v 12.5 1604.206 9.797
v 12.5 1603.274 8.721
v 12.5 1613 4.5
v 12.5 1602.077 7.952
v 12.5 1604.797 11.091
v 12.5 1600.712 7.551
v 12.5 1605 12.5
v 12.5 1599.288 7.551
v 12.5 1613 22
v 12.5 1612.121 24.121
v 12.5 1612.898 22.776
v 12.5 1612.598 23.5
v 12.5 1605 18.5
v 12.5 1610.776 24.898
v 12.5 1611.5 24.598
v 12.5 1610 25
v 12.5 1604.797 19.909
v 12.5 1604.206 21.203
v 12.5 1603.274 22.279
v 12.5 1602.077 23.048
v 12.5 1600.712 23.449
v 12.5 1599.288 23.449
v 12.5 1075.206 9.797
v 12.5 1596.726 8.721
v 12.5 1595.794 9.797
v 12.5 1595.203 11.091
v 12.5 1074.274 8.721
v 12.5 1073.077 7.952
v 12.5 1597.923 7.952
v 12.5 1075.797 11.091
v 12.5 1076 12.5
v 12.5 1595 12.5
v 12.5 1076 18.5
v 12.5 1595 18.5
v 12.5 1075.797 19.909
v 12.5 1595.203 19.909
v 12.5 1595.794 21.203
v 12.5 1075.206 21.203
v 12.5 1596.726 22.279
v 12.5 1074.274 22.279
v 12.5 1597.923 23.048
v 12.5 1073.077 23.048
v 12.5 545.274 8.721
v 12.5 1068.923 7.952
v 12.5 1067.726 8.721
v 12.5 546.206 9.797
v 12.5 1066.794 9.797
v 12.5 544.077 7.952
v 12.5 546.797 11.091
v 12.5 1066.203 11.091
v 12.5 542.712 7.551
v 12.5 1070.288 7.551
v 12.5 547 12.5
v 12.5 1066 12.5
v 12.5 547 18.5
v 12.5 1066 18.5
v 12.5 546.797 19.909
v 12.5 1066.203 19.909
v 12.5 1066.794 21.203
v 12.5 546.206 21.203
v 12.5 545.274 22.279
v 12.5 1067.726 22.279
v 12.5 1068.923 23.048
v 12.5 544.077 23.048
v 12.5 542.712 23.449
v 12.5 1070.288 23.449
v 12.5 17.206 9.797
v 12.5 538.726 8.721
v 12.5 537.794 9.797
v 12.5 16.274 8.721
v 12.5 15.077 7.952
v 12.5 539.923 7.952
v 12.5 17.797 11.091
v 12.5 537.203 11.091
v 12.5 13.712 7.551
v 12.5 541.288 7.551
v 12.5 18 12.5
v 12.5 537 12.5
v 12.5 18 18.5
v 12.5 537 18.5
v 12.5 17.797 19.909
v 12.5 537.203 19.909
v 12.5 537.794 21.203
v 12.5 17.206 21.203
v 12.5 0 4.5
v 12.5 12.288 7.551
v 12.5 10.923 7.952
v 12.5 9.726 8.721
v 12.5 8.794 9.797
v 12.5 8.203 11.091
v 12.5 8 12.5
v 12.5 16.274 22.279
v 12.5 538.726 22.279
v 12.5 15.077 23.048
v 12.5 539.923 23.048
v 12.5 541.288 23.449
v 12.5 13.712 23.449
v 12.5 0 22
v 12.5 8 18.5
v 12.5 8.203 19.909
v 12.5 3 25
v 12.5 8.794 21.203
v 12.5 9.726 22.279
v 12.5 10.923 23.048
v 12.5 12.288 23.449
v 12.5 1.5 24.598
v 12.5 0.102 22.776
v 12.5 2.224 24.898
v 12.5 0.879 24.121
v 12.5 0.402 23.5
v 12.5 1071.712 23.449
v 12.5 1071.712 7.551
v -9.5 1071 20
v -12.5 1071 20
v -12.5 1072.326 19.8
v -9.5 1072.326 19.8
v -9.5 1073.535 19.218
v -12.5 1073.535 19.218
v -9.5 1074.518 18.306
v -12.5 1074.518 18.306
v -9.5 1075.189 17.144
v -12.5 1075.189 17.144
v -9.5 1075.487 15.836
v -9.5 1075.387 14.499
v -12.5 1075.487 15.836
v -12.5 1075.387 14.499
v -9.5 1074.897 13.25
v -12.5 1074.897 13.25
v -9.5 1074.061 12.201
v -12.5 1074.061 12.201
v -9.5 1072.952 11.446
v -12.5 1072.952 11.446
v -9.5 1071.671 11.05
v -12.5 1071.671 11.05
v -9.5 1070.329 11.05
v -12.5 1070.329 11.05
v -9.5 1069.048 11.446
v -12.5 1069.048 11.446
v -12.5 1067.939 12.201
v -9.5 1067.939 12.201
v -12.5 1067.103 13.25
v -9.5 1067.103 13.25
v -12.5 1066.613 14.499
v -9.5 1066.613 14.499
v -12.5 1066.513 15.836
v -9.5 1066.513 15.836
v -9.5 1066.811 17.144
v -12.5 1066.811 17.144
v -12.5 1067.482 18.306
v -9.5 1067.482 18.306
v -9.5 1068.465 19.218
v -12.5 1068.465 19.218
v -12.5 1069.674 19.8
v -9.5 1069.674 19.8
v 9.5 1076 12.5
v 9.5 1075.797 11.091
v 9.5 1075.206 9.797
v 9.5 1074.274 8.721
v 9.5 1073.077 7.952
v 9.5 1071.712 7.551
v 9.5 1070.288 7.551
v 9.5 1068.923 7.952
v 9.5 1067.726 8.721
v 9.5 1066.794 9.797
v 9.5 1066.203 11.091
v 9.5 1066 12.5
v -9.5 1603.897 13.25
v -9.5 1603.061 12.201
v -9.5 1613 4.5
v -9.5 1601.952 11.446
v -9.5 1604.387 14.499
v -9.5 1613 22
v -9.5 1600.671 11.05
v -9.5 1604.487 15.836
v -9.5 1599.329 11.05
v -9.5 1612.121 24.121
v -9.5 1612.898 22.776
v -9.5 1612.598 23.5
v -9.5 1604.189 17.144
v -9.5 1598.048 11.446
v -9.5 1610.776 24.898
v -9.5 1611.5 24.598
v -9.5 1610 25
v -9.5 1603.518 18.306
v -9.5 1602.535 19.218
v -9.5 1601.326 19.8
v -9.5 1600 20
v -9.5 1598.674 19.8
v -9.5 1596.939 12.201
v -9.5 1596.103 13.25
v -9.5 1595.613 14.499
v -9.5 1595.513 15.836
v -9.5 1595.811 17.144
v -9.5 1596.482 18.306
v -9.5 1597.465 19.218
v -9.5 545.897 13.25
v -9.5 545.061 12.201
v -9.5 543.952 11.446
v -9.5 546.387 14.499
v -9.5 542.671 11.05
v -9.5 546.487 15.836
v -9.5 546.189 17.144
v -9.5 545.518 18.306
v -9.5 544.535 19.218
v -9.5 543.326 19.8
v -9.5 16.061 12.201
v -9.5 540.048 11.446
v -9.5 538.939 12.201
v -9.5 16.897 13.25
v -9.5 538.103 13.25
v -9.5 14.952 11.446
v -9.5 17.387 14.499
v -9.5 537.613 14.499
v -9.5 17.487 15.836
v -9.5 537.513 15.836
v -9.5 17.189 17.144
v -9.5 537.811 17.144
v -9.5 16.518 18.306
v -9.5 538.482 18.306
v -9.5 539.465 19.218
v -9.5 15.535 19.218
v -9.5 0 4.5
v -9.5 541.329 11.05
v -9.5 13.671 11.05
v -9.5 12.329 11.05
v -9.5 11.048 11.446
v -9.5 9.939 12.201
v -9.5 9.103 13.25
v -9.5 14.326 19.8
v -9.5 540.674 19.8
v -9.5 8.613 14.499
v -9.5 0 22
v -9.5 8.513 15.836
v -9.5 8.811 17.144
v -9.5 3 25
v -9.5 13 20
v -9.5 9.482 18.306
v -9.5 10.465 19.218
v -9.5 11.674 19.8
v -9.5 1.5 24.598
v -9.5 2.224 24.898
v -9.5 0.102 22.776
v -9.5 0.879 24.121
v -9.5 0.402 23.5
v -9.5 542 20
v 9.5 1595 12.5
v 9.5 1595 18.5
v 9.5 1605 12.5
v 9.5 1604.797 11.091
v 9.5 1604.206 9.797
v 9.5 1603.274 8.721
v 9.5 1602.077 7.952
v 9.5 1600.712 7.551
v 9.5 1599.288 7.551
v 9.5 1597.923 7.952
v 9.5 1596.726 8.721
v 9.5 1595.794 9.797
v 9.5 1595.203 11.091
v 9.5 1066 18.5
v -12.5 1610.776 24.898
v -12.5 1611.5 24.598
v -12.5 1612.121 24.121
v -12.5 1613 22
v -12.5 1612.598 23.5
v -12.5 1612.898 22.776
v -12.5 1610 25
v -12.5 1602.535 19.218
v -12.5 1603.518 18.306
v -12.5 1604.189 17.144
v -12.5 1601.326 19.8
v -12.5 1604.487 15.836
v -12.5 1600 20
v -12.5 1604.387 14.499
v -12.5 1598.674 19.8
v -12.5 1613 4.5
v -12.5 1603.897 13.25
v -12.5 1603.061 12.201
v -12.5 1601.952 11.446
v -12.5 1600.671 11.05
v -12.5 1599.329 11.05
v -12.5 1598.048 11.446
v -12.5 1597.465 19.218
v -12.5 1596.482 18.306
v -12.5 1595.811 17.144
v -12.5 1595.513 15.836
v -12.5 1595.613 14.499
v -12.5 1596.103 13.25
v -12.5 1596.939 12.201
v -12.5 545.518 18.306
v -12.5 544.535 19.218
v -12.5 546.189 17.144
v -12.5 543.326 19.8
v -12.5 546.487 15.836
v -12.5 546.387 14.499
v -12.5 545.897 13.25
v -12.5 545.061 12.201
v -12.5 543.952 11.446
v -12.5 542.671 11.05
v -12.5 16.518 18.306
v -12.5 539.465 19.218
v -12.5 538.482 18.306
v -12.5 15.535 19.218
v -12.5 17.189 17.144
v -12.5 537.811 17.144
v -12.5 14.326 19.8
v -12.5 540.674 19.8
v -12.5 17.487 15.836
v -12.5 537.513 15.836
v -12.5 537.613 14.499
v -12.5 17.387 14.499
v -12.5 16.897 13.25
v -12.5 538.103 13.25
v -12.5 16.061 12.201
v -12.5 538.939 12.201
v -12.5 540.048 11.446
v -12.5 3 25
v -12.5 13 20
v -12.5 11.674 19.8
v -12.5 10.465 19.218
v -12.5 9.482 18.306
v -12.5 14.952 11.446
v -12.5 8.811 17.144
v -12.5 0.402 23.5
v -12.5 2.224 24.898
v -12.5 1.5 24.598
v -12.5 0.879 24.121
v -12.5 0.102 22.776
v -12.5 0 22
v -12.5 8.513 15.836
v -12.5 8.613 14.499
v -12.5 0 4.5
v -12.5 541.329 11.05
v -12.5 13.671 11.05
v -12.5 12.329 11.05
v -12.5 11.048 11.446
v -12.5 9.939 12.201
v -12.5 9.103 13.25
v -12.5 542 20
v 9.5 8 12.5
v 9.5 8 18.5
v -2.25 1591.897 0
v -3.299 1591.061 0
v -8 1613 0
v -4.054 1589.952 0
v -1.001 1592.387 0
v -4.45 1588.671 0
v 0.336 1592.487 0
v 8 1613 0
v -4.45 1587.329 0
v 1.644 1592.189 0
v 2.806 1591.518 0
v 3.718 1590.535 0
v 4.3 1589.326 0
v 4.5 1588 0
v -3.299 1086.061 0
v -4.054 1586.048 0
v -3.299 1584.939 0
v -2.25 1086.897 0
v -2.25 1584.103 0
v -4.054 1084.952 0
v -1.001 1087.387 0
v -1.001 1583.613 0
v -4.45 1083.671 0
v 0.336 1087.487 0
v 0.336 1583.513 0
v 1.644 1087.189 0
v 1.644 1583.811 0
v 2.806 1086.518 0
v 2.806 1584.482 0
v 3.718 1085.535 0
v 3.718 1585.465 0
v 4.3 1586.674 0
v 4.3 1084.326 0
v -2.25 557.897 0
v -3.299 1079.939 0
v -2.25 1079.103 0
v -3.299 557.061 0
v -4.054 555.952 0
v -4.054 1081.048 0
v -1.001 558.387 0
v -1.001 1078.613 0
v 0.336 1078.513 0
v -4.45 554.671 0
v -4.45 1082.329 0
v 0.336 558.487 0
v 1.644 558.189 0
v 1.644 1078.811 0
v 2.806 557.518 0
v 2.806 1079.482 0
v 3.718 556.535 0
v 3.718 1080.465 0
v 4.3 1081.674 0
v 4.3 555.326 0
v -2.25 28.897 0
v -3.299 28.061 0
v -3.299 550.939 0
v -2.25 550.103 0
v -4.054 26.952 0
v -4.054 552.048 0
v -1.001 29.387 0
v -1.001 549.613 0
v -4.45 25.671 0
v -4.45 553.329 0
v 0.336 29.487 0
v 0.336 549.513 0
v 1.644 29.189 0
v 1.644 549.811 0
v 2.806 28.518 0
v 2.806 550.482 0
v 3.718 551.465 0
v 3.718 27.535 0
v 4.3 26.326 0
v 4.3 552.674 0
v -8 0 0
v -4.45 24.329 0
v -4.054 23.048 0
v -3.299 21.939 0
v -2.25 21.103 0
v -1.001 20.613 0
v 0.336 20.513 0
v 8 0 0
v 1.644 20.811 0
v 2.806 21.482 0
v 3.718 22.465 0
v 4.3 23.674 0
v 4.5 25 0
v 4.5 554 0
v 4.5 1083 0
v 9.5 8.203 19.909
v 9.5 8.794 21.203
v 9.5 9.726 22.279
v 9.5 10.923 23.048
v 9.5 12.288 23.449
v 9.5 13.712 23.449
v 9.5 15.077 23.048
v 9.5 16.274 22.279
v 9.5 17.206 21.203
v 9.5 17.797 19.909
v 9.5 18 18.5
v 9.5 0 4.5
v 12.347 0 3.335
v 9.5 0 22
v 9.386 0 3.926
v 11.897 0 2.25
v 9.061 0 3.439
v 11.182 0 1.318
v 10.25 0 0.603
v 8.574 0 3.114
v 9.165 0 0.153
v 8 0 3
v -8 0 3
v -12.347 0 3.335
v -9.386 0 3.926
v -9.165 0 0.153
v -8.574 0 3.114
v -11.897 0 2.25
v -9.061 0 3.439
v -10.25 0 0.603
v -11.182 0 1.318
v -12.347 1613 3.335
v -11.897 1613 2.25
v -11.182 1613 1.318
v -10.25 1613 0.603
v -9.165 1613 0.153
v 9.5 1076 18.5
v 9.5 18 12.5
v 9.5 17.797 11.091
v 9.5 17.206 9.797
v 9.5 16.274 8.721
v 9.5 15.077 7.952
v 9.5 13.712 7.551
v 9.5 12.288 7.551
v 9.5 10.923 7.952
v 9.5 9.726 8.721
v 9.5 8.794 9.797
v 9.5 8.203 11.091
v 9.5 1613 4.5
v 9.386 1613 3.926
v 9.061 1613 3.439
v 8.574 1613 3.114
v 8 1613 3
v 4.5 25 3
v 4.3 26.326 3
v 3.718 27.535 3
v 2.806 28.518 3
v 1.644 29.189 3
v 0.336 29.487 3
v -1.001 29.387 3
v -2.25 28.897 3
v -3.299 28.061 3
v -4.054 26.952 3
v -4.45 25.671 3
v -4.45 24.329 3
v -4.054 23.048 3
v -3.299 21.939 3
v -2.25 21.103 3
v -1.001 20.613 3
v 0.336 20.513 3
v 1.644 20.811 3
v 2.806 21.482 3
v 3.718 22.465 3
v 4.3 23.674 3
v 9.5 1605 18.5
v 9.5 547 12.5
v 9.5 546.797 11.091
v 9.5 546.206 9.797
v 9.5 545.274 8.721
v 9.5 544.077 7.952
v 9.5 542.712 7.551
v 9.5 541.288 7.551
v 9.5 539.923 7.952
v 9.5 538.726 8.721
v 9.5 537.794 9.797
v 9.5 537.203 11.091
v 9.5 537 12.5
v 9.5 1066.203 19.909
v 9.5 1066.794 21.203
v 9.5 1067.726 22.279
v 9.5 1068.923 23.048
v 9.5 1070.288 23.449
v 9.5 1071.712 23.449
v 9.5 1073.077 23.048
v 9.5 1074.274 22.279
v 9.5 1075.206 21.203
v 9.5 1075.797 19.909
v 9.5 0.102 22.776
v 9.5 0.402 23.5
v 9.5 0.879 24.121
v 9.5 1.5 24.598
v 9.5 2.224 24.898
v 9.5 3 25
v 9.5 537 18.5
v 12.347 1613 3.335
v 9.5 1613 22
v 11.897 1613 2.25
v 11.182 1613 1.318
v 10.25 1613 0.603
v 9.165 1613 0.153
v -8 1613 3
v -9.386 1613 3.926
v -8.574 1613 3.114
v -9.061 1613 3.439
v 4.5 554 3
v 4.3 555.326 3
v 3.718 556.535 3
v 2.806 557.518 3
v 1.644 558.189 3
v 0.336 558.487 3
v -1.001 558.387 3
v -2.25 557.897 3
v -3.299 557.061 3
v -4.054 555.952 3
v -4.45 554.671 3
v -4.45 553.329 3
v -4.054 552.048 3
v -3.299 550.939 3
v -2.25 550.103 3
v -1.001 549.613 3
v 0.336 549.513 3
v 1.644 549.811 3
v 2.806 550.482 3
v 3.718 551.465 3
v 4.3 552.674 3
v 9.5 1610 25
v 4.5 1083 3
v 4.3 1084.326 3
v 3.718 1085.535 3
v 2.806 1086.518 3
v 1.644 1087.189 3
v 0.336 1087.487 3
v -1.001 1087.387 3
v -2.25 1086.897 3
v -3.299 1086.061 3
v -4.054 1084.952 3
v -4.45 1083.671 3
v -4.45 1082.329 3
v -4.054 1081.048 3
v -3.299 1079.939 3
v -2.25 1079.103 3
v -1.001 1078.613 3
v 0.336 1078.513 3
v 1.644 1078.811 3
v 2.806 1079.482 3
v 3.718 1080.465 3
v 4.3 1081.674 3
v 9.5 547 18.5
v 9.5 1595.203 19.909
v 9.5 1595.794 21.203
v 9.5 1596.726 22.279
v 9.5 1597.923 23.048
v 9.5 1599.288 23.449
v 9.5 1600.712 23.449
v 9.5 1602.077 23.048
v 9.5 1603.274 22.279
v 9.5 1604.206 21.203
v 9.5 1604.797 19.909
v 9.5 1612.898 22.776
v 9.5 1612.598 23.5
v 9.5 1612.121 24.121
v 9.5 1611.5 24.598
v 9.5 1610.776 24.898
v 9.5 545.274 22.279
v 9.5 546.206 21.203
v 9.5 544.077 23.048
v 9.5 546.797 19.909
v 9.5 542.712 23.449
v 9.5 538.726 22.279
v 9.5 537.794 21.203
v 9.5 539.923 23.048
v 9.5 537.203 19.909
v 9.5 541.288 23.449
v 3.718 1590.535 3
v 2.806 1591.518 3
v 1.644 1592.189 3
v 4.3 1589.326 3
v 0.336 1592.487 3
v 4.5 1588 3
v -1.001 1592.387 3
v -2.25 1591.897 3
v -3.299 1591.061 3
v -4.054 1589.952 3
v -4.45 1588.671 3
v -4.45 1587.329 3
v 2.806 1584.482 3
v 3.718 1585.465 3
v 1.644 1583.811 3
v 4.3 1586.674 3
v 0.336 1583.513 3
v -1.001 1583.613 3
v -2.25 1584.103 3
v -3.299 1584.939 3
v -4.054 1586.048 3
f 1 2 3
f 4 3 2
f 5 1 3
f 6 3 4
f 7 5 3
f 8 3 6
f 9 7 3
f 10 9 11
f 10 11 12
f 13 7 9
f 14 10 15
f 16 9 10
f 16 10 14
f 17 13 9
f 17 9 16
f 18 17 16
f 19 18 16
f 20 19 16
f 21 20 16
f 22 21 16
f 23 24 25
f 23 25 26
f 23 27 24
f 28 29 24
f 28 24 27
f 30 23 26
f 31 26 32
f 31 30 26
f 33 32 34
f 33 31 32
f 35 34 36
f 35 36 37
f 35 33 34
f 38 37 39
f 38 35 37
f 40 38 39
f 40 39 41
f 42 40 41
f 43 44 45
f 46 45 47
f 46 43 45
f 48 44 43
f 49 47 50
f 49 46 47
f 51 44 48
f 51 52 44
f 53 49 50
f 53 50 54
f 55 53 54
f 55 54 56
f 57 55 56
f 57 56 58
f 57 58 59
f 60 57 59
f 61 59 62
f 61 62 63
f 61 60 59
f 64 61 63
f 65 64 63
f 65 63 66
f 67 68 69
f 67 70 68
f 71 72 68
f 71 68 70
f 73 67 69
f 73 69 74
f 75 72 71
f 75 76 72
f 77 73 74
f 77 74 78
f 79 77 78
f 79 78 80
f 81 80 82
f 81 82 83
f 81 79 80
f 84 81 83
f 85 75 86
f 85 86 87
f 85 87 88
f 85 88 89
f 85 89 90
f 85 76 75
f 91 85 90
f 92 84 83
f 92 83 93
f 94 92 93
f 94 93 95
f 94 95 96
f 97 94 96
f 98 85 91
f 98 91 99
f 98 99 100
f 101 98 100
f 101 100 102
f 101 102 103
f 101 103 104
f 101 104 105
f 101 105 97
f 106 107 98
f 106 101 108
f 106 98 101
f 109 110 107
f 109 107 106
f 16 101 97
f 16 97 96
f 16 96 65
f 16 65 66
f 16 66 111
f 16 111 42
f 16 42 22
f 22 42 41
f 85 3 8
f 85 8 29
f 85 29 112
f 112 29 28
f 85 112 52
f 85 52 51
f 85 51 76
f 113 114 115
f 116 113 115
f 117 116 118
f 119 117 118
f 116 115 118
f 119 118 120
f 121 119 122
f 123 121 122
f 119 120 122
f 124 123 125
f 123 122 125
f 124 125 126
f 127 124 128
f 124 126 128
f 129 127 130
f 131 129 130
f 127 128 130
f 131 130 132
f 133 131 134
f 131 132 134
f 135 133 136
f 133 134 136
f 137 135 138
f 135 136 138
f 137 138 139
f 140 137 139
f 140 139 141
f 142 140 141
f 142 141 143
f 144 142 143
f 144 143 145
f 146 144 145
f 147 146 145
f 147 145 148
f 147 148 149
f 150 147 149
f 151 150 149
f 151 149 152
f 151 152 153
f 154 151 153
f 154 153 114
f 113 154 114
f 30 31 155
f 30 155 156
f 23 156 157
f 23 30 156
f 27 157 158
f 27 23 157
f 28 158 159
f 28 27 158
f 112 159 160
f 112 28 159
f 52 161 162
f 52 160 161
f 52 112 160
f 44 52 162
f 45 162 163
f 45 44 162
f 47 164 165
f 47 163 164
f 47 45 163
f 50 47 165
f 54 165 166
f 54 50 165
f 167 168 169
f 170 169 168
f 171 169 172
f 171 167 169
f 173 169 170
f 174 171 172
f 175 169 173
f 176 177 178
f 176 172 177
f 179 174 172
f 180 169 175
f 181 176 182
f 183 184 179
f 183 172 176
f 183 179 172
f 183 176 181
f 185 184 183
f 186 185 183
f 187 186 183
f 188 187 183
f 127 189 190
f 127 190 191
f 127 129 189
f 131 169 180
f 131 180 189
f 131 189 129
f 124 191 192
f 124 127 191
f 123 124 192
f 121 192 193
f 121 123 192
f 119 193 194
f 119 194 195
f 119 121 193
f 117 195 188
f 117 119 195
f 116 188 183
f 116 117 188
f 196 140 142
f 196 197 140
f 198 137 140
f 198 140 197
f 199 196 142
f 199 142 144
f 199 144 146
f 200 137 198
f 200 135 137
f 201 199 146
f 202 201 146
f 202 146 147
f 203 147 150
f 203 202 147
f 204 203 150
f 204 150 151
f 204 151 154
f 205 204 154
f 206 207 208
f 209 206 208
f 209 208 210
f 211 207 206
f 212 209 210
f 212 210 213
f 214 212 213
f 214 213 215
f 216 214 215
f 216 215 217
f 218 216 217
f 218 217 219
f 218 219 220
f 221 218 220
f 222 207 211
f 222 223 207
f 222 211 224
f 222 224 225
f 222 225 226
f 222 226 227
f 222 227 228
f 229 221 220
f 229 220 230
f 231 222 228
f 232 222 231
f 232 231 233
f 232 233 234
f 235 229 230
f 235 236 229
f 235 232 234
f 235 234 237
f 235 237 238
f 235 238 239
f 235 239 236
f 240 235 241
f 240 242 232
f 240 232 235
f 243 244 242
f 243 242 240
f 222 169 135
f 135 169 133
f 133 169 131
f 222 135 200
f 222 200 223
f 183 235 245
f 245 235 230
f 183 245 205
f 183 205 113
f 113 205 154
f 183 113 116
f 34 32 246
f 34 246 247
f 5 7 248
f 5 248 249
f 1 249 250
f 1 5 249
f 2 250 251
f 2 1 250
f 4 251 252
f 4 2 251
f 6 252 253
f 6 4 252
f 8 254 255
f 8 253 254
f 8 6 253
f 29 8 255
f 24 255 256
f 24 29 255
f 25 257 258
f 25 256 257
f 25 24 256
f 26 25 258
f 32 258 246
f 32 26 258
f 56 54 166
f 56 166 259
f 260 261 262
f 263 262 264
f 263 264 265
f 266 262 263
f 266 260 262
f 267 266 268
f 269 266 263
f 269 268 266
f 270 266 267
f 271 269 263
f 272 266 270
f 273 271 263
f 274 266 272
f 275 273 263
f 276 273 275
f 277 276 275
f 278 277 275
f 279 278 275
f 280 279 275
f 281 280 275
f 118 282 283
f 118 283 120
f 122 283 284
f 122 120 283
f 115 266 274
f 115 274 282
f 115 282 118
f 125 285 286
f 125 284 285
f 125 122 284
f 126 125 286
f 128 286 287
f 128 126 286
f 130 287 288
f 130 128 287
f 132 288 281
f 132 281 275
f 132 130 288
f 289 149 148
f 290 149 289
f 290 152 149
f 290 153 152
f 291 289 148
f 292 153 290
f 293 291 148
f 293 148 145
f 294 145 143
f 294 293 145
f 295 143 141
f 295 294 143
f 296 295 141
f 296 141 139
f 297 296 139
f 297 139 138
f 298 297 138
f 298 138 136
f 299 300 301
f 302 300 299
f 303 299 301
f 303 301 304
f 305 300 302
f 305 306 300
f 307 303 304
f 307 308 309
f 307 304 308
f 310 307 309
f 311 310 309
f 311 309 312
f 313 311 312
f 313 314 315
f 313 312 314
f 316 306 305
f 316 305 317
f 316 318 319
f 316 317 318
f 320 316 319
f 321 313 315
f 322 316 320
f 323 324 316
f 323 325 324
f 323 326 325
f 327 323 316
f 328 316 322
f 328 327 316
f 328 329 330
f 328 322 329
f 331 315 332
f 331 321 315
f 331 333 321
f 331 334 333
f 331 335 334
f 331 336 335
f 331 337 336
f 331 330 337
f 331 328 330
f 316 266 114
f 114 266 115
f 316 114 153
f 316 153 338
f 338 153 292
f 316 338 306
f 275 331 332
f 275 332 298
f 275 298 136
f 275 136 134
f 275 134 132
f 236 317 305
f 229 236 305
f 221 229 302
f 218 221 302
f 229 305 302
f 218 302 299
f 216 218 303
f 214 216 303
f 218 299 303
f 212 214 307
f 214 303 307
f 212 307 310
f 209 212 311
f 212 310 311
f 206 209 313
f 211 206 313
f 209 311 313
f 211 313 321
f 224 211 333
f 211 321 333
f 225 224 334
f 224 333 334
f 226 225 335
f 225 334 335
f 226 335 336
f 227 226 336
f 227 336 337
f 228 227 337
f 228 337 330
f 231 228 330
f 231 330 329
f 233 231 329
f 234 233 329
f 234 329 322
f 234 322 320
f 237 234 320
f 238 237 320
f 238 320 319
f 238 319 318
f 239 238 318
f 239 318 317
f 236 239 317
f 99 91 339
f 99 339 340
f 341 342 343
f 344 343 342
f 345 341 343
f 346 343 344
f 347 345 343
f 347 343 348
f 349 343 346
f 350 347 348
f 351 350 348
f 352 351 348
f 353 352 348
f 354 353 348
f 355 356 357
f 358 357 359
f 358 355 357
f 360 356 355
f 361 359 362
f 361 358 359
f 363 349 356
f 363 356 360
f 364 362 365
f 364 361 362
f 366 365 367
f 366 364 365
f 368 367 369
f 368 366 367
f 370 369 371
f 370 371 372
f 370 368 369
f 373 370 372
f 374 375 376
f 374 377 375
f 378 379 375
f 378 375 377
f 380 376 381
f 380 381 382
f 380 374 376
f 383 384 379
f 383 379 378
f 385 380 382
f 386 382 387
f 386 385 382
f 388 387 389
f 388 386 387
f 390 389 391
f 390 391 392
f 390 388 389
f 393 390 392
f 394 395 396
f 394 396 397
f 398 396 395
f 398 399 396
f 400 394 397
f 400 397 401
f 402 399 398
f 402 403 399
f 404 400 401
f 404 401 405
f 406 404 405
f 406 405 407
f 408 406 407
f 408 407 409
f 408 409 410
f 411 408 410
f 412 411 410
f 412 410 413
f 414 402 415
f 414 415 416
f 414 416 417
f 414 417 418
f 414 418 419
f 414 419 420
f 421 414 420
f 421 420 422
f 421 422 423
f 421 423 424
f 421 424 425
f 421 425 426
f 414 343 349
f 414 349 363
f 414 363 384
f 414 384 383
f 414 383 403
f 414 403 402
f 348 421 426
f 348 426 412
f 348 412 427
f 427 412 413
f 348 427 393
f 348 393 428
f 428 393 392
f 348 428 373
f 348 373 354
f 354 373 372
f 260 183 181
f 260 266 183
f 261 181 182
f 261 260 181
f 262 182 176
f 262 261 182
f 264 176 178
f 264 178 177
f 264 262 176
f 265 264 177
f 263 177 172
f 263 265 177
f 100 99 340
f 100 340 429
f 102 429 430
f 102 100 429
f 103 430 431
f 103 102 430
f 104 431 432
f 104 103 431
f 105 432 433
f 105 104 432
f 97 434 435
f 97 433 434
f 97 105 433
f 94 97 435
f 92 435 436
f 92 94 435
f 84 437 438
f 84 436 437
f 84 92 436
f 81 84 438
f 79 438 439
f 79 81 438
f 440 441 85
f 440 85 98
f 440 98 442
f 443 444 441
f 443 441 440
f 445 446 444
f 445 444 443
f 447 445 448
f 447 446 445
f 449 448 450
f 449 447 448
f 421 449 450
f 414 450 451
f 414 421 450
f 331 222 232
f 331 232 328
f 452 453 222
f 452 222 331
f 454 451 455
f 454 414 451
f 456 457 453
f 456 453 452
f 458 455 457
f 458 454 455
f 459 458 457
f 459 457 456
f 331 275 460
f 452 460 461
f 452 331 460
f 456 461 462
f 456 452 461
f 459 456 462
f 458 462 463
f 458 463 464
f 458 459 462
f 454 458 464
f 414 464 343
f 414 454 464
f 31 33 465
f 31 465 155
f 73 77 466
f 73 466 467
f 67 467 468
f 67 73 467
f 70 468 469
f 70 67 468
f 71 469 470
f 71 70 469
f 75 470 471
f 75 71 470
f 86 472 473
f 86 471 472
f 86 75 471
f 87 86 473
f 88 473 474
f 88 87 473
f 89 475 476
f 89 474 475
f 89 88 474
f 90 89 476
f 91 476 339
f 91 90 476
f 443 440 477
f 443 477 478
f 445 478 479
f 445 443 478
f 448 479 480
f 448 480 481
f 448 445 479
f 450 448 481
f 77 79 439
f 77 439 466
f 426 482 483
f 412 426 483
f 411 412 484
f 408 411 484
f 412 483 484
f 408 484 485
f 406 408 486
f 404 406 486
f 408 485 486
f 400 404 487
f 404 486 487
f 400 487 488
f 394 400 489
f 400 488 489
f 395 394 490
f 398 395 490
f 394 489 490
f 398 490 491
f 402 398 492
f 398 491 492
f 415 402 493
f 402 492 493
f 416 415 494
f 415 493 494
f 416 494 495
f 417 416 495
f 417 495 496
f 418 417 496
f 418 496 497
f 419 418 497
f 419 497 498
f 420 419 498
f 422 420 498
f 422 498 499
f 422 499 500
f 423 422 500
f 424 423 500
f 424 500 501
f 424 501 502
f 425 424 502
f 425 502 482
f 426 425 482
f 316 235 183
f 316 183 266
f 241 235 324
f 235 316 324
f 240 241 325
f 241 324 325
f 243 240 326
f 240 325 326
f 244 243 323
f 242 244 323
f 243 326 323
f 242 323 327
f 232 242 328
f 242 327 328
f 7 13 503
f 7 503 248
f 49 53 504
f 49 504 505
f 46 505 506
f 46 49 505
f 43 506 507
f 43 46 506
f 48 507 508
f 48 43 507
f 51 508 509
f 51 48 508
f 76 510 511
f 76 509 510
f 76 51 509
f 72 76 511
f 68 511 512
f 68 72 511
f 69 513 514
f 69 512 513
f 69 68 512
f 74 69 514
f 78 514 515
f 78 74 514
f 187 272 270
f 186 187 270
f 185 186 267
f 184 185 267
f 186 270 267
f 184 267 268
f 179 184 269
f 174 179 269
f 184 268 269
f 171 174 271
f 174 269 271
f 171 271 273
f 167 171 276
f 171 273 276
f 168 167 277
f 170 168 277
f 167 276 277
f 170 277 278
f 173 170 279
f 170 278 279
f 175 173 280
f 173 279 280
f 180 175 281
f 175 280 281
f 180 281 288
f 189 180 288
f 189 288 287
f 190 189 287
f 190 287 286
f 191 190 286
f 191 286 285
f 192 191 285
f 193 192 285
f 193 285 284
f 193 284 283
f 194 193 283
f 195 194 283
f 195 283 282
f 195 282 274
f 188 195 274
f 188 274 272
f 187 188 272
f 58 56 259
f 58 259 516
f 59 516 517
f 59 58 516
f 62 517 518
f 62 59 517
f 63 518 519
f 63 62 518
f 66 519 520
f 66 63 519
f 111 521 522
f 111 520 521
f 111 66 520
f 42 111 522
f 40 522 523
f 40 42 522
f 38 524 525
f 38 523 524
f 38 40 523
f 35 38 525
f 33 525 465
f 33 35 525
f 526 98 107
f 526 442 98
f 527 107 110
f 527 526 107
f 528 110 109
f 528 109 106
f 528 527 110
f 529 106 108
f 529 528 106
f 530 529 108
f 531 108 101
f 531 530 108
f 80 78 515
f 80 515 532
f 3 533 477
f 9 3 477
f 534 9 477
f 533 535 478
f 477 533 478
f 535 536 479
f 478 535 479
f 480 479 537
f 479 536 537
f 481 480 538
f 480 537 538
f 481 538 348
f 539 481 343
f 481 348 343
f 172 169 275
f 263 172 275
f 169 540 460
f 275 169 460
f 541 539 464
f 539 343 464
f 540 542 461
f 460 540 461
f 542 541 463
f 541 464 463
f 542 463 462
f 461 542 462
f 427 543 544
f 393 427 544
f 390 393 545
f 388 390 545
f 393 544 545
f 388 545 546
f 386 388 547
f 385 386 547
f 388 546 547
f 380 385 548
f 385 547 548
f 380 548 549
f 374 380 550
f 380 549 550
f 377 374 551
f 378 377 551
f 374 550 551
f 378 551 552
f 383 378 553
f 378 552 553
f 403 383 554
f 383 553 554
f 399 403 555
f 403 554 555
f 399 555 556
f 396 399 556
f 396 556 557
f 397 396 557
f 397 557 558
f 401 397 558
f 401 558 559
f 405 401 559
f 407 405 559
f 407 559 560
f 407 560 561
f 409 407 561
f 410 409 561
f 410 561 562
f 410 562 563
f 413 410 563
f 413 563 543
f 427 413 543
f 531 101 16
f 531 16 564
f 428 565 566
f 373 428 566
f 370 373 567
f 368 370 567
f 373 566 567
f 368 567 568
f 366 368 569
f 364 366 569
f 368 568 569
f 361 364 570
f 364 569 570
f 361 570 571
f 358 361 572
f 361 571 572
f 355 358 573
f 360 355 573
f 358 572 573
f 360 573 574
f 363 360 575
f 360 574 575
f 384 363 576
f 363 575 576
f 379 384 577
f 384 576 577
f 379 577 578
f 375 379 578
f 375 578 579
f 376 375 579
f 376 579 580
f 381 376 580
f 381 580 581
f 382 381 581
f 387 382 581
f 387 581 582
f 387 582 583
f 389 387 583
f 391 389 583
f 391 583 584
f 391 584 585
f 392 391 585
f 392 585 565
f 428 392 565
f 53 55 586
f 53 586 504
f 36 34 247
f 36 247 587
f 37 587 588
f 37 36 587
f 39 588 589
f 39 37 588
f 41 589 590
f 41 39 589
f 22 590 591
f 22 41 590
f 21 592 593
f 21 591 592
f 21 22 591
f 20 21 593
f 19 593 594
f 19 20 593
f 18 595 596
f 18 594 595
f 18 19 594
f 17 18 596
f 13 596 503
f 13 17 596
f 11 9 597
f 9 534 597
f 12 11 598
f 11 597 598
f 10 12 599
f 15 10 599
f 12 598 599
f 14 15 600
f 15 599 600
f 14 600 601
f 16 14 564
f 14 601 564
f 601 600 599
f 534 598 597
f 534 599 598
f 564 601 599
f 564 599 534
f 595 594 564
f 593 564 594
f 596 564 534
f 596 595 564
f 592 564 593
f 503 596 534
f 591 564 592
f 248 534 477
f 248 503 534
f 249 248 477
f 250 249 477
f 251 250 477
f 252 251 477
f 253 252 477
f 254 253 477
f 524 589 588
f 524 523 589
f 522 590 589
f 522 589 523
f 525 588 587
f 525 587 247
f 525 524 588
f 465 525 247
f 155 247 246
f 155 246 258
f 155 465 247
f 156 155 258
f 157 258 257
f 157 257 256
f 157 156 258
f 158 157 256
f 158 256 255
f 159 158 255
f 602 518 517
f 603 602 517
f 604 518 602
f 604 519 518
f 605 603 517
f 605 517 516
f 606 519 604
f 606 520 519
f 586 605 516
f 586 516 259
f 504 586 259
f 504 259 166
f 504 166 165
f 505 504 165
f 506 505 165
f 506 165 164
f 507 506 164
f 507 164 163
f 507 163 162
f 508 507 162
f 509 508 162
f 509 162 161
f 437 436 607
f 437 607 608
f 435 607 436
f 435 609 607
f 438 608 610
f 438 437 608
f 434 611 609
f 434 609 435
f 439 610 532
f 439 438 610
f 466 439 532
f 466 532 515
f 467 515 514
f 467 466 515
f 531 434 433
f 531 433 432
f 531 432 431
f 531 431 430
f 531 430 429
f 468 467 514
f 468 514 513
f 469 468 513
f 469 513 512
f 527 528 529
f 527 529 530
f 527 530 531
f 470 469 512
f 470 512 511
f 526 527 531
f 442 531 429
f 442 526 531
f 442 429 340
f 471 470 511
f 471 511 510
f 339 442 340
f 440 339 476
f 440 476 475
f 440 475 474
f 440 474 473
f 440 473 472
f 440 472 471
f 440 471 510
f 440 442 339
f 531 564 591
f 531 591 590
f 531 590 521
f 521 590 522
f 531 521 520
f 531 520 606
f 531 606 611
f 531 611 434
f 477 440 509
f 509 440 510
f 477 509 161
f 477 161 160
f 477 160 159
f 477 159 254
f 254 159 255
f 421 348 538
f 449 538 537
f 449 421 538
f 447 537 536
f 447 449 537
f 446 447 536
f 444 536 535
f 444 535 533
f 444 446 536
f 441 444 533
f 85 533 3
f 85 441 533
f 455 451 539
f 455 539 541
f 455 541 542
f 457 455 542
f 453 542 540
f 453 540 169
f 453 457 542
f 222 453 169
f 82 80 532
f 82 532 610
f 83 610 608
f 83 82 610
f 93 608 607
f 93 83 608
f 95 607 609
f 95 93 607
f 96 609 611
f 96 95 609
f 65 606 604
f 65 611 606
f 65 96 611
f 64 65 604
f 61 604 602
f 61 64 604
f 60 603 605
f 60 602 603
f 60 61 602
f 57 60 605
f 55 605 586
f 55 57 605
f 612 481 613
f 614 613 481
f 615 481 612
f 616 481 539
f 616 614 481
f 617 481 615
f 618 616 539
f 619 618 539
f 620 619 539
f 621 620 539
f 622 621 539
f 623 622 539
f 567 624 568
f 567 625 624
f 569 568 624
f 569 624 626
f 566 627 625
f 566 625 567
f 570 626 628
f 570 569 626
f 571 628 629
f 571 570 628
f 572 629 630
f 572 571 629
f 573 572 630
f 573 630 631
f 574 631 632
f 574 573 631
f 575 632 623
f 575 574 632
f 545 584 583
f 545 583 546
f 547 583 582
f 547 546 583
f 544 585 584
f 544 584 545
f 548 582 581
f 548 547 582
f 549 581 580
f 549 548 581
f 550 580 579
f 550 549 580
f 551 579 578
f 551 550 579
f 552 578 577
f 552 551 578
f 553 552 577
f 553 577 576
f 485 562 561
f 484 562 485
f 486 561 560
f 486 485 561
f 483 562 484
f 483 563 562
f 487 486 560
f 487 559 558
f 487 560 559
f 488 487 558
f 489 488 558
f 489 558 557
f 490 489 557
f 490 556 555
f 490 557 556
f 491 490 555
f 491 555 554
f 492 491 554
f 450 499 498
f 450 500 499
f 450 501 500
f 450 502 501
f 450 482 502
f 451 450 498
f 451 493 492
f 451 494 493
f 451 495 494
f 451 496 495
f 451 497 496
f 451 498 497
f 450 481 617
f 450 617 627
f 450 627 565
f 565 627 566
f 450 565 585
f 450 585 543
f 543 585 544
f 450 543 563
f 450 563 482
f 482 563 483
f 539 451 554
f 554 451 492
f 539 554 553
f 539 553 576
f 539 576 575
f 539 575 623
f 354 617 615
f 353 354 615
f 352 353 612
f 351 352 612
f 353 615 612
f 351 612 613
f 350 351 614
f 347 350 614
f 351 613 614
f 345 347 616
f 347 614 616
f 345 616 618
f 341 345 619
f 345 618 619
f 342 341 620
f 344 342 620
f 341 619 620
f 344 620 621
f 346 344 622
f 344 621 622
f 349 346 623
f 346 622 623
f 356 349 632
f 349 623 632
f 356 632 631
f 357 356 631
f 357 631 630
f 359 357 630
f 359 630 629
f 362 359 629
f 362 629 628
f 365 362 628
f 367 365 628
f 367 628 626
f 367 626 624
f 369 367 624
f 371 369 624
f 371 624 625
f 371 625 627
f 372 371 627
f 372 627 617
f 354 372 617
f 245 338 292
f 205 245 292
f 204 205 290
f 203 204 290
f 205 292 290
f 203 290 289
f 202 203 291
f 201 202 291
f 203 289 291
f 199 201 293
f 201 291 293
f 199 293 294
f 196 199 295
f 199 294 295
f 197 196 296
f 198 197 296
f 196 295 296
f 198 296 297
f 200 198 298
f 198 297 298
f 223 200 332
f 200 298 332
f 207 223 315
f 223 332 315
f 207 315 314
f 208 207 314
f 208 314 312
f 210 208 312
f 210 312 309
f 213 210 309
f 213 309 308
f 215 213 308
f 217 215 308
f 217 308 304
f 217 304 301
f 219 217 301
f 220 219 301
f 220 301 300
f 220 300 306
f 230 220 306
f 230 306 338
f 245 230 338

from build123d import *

# Parameters (mm, degrees)
BASE_FLANGE1_DEPTH = 1613
CUT_EXTRUDE1_REACH = 1615.387
SKETCH6_R          = 4.5
FILLET1_R          = 3
CUT_EXTRUDE2_REACH = 1615.387
LPATTERN1_COUNT    = 4
LPATTERN1_PITCH    = 529
CUT_EXTRUDE3_REACH = 1615.198
SKETCH11_R         = 4.5
LPATTERN2_COUNT    = 3
LPATTERN2_PITCH    = 529
CUT_EXTRUDE4_REACH = 1615.198
SKETCH12_R         = 4.5


# Sheet-metal steps are written as plain solids
with BuildPart() as part:
    # Sketch1 → Base-Flange1 (new body)
    with BuildSketch(Plane(origin=(0, 0, 0), x_dir=(1, 0, 0), z_dir=(0, 1, 0))):
        with BuildLine():
            Line((-12.5, -25), (-12.5, -4.5))
            ThreePointArc((-12.5, -4.5), (-11.181980515, -1.318019485), (-8, 0))
            Line((-8, 0), (8, 0))
            ThreePointArc((8, 0), (11.181980515, -1.318019485), (12.5, -4.5))
            Line((12.5, -4.5), (12.5, -25))
            Line((12.5, -25), (9.5, -25))
            Line((9.5, -25), (9.5, -4.5))
            ThreePointArc((9.5, -4.5), (9.060660172, -3.439339828), (8, -3))
            Line((8, -3), (-8, -3))
            ThreePointArc((-8, -3), (-9.060660172, -3.439339828), (-9.5, -4.5))
            Line((-9.5, -4.5), (-9.5, -25))
            Line((-9.5, -25), (-12.5, -25))
        make_face()
    extrude(amount=BASE_FLANGE1_DEPTH)

    # Sketch6 → Cut-Extrude1 (cut, up to next)
    with BuildSketch(Plane.ZY.offset(12.5), mode=Mode.PRIVATE) as cut_extrude1_sk1:
        with Locations((15.5, 13)):
            Circle(SKETCH6_R)
    cut_extrude1_tool1 = extrude(cut_extrude1_sk1.sketch, amount=-CUT_EXTRUDE1_REACH, mode=Mode.PRIVATE) & part.part
    cut_extrude1 = cut_extrude1_tool1.solids().sort_by_distance((-12.5, 13, 15.5))[0]
    add(cut_extrude1, mode=Mode.SUBTRACT)

    # Fillet1
    fillet1_edges = [part.edges().sort_by_distance(p)[0] for p in [
        (11, 0, 25),
        (-11, 0, 25),
        (11, 1613, 25),
        (-11, 1613, 25),
    ]]
    fillet(fillet1_edges, radius=FILLET1_R)

    # Sketch7 → Cut-Extrude2 (cut, up to next)
    with BuildSketch(Plane(origin=(12.5, 0, 0), x_dir=(0, 0, -1), z_dir=(1, 0, 0)), mode=Mode.PRIVATE) as cut_extrude2_sk1:
        with BuildLine():
            Line((-18.5, 18), (-12.5, 18))
            ThreePointArc((-12.5, 18), (-7.5, 13), (-12.5, 8))
            Line((-12.5, 8), (-18.5, 8))
            ThreePointArc((-18.5, 8), (-23.5, 13), (-18.5, 18))
        make_face()
    cut_extrude2_tool1 = extrude(cut_extrude2_sk1.sketch, amount=-CUT_EXTRUDE2_REACH, mode=Mode.PRIVATE) & part.part
    cut_extrude2 = cut_extrude2_tool1.solids().sort_by_distance((12.5, 13, 15.5))[0]
    add(cut_extrude2, mode=Mode.SUBTRACT)

    # LPattern1: Cut-Extrude1, Cut-Extrude2 ×4
    with Locations(*[(0, i * LPATTERN1_PITCH, 0) for i in range(1, LPATTERN1_COUNT)]):
        add(cut_extrude1, mode=Mode.SUBTRACT)
        add(cut_extrude2, mode=Mode.SUBTRACT)

    # Sketch11 → Cut-Extrude3 (cut, up to next)
    with BuildSketch(Plane.XY.offset(3), mode=Mode.PRIVATE) as cut_extrude3_sk1:
        with Locations((0, 25)):
            Circle(SKETCH11_R)
    cut_extrude3_tool1 = extrude(cut_extrude3_sk1.sketch, amount=-CUT_EXTRUDE3_REACH, mode=Mode.PRIVATE) & part.part
    cut_extrude3 = cut_extrude3_tool1.solids().sort_by_distance((0, 25, 3))[0]
    add(cut_extrude3, mode=Mode.SUBTRACT)

    # LPattern2: Cut-Extrude3 ×3
    with Locations(*[(0, i * LPATTERN2_PITCH, 0) for i in range(1, LPATTERN2_COUNT)]):
        add(cut_extrude3, mode=Mode.SUBTRACT)

    # Sketch12 → Cut-Extrude4 (cut, up to next)
    with BuildSketch(Plane.XY.offset(3), mode=Mode.PRIVATE) as cut_extrude4_sk1:
        with Locations((0, 1588)):
            Circle(SKETCH12_R)
    cut_extrude4_tool1 = extrude(cut_extrude4_sk1.sketch, amount=-CUT_EXTRUDE4_REACH, mode=Mode.PRIVATE) & part.part
    add(cut_extrude4_tool1.solids().sort_by_distance((0, 1588, 3))[0], mode=Mode.SUBTRACT)


solid = part.part
